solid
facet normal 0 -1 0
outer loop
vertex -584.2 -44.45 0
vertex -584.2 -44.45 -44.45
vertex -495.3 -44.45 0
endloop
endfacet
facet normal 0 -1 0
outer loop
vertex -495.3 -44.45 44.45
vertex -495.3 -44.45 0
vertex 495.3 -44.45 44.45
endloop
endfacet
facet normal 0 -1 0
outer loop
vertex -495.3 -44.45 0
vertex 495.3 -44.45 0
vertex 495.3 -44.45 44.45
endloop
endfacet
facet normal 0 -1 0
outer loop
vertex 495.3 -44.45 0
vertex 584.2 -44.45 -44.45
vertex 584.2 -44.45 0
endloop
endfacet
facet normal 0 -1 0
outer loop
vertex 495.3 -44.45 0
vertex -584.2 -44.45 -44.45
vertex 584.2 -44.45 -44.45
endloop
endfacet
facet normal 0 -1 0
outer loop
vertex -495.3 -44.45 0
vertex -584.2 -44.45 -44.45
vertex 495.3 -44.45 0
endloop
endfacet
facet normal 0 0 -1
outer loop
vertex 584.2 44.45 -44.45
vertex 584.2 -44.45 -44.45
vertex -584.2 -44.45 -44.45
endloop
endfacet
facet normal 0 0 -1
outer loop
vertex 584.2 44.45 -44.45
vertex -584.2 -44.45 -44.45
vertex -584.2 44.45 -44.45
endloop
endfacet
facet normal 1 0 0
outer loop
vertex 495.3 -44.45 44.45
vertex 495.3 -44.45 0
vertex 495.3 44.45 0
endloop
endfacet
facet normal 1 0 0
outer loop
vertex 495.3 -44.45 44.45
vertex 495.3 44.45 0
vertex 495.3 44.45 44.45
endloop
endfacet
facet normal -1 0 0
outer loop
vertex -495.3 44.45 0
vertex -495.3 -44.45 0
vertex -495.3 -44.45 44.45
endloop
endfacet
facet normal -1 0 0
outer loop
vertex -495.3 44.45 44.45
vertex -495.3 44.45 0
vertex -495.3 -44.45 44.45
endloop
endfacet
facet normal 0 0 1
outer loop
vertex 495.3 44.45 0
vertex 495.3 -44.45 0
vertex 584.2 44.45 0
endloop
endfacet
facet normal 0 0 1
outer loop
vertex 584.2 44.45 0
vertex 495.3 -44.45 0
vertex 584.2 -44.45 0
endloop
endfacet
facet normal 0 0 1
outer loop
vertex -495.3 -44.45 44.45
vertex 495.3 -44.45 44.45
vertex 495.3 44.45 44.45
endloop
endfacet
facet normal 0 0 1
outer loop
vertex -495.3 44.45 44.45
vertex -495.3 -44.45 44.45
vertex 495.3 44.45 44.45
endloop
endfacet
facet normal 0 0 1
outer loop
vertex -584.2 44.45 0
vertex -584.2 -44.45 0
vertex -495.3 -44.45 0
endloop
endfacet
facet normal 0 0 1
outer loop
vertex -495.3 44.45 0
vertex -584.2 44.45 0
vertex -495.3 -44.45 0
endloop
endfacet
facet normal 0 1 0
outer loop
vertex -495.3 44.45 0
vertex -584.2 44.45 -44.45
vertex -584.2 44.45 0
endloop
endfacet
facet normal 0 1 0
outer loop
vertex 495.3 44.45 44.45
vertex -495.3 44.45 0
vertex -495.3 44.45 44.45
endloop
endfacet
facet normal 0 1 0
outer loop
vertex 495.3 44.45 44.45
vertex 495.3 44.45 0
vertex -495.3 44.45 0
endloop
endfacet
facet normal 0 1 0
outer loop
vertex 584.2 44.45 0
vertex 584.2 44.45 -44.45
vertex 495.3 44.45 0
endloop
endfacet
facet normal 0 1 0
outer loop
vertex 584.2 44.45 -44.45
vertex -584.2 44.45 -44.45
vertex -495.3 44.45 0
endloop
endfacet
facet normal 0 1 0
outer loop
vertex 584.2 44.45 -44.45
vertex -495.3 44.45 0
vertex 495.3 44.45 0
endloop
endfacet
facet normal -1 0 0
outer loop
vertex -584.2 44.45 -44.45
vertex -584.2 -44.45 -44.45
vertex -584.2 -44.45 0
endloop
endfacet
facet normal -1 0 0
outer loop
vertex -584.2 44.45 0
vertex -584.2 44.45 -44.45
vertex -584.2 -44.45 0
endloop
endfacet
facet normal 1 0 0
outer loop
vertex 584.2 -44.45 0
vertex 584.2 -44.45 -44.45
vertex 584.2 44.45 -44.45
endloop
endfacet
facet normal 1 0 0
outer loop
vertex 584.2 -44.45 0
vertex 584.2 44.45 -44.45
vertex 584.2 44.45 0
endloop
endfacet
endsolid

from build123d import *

# Parameters (mm, degrees)
F0_W     = 88.9
F0_H     = 88.9
F1_DEPTH = 673.1
F2_W     = 88.9
F2_H     = 44.45
F3_DEPTH = 88.901
F4_W     = 88.9
F4_H     = 88.9
F5_DEPTH = 88.901


with BuildPart() as f1:
    # F0 (on Right) → F1 (new body, symmetric)
    with BuildSketch(Plane.YZ):
        Rectangle(F0_W, F0_H)
    extrude(amount=F1_DEPTH, both=True)

    # F2 (on face) → F3 (cut, through all)
    with BuildSketch(Plane.XZ.offset(44.45)):
        with Locations((-539.75, 22.225)):
            Rectangle(F2_W, F2_H)
        with Locations((539.75, 22.225)):
            Rectangle(F2_W, F2_H)
    extrude(amount=-F3_DEPTH, mode=Mode.SUBTRACT)

    # F4 (on face) → F5 (cut, through all)
    with BuildSketch(Plane.XZ.offset(44.45)):
        with Locations((-628.65, 0)):
            Rectangle(F4_W, F4_H)
        with Locations((628.65, 0)):
            Rectangle(F4_W, F4_H)
    extrude(amount=-F5_DEPTH, mode=Mode.SUBTRACT)


solid = f1.part
